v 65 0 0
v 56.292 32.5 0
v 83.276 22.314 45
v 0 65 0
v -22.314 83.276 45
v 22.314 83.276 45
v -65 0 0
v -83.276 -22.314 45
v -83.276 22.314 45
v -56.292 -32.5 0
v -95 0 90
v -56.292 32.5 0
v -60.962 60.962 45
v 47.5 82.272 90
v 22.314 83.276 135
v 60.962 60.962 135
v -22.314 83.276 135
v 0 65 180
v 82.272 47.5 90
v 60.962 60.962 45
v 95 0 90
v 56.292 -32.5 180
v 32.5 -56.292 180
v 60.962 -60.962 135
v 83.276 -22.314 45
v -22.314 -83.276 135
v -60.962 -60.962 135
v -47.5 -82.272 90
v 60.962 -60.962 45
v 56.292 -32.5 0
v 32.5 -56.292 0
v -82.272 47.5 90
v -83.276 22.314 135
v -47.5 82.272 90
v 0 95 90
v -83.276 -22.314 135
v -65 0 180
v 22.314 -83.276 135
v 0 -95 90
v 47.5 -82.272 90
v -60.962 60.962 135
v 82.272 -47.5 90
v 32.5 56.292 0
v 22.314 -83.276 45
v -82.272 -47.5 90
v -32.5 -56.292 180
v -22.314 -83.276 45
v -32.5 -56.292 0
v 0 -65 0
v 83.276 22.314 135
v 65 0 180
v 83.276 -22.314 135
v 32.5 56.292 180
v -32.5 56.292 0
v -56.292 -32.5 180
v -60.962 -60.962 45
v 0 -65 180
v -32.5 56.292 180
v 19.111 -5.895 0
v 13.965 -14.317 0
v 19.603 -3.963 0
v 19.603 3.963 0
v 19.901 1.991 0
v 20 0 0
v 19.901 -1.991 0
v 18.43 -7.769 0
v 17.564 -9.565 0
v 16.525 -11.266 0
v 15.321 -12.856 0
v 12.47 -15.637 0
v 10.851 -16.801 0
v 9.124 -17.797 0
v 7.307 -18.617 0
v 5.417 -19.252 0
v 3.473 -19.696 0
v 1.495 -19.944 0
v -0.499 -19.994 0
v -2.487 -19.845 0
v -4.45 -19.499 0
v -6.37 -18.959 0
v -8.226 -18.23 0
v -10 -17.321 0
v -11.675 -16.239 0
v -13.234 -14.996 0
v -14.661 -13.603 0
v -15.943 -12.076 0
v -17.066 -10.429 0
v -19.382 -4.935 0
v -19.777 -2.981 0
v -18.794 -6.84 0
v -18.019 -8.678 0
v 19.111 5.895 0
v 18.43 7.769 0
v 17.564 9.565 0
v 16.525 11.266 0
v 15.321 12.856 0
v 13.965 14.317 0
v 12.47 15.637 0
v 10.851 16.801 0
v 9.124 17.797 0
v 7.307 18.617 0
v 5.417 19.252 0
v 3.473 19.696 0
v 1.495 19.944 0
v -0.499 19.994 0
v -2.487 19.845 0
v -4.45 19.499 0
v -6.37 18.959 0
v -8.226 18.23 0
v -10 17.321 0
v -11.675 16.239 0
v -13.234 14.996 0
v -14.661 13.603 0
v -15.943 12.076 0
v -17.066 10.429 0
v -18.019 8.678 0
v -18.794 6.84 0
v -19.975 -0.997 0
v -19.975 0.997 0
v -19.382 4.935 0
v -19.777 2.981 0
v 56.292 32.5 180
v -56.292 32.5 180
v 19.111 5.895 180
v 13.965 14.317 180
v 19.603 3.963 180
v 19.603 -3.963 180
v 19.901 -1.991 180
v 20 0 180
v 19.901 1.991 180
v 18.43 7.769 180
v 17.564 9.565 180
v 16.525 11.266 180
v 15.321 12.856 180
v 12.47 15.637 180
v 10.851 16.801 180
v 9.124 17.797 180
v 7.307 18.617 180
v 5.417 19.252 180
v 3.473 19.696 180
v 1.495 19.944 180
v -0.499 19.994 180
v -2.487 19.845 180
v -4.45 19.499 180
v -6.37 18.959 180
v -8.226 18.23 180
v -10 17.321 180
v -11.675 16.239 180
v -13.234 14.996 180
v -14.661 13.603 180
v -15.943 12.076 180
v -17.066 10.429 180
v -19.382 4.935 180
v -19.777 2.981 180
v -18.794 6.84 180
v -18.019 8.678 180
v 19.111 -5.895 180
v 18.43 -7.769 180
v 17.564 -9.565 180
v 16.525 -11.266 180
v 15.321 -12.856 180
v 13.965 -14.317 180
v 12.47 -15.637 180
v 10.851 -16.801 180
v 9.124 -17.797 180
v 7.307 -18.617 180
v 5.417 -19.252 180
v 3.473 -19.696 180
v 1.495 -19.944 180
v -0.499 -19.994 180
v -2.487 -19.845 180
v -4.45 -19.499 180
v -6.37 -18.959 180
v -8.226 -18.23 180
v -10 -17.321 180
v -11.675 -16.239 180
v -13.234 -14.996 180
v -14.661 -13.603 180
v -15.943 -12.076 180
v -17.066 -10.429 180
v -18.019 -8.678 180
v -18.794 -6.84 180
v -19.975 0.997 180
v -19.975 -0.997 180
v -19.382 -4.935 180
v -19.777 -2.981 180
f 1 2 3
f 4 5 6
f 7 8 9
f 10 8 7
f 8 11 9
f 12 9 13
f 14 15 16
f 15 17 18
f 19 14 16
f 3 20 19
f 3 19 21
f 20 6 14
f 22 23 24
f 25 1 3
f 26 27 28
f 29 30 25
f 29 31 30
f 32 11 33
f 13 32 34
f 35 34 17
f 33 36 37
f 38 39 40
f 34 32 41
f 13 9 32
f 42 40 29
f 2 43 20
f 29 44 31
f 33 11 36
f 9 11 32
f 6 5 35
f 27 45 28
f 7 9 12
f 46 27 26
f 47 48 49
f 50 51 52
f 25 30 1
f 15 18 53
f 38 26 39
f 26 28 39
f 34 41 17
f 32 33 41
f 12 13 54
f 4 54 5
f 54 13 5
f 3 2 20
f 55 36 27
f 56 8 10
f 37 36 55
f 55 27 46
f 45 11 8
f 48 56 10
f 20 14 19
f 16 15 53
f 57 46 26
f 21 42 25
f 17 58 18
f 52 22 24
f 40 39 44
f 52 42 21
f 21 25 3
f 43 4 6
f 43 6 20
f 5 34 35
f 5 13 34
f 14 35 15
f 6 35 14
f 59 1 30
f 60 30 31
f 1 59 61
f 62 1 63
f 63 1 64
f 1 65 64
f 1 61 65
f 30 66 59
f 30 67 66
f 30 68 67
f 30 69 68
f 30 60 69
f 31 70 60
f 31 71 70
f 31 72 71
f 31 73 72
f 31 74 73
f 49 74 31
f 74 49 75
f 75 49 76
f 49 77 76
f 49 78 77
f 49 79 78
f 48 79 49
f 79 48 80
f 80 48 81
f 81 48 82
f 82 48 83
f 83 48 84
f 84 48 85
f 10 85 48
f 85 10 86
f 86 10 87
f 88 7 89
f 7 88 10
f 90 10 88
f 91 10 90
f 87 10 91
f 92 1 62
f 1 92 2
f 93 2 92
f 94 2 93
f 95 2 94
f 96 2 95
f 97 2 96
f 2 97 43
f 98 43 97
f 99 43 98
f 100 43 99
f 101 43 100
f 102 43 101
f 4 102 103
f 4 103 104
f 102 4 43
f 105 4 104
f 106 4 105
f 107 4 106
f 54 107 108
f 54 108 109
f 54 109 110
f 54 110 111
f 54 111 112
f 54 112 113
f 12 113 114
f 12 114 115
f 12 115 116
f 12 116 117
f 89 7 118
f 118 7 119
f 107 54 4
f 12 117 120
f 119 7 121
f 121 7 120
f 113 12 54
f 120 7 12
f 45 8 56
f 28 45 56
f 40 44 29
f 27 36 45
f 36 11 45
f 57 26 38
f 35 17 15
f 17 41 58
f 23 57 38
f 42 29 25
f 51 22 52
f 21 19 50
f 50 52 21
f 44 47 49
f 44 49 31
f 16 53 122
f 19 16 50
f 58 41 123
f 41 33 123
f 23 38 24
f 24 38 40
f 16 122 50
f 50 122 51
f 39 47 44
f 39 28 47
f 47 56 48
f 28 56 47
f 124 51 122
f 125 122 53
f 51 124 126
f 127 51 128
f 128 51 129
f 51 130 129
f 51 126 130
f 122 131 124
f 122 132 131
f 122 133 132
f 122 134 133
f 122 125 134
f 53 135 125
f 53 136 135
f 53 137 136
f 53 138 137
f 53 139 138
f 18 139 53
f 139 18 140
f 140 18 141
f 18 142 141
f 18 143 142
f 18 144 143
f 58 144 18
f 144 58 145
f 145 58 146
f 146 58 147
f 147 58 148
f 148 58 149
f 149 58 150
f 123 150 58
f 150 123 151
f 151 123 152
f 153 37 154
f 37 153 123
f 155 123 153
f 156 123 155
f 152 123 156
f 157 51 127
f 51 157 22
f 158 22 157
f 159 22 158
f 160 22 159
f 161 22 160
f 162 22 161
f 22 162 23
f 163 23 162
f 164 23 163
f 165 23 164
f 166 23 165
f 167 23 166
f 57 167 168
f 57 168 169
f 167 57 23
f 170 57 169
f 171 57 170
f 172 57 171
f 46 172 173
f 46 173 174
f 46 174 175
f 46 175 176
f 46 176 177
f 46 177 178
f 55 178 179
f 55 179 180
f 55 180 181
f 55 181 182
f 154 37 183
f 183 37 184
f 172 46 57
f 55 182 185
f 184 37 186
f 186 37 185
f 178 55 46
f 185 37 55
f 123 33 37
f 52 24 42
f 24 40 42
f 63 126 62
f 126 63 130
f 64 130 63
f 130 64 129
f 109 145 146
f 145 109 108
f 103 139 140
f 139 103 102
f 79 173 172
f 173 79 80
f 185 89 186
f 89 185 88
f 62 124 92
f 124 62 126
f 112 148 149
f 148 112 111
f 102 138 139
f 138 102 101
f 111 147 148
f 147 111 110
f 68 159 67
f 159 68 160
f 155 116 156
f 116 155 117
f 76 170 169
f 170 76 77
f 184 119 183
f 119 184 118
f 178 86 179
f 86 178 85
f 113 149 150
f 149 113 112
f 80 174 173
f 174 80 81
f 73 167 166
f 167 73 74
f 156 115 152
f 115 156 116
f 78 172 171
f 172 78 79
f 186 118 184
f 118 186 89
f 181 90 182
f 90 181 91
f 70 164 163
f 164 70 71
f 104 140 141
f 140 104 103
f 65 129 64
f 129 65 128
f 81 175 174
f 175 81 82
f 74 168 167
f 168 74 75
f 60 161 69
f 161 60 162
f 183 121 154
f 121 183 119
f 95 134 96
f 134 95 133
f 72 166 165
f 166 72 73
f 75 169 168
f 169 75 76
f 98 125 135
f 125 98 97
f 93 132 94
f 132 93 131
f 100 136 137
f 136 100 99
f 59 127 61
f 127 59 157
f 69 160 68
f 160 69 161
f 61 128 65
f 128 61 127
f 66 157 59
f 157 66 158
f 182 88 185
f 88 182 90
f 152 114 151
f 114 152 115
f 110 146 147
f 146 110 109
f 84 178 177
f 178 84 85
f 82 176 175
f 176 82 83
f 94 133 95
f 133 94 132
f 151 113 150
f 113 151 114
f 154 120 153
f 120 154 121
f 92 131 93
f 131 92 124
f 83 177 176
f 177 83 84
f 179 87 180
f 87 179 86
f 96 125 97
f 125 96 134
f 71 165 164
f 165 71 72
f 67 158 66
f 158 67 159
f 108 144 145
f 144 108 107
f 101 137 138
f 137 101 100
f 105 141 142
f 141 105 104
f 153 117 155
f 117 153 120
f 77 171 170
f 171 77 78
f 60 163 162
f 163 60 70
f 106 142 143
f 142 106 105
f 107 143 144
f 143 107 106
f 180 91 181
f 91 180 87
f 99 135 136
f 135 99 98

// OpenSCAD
// file: ../../noise/noisey.scad
CylinderPoints = [[65.0, 0.0, 0.0], [56.2917, 32.5, 0.0], [32.5, 56.2917, 0.0], [0.0, 65.0, 0.0], [-32.5, 56.2917, 0.0], [-56.2917, 32.5, 0.0], [-65.0, 0.0, 0.0], [-56.2917, -32.5, 0.0], [-32.5, -56.2917, 0.0], [-0.0, -65.0, 0.0], [32.5, -56.2917, 0.0], [56.2917, -32.5, 0.0], [83.2756, 22.3136, 45.0], [60.9619, 60.9619, 45.0], [22.3136, 83.2756, 45.0], [-22.3136, 83.2756, 45.0], [-60.9619, 60.9619, 45.0], [-83.2756, 22.3136, 45.0], [-83.2756, -22.3136, 45.0], [-60.9619, -60.9619, 45.0], [-22.3136, -83.2756, 45.0], [22.3136, -83.2756, 45.0], [60.9619, -60.9619, 45.0], [83.2756, -22.3136, 45.0], [95.0, 0.0, 90.0], [82.2724, 47.5, 90.0], [47.5, 82.2724, 90.0], [0.0, 95.0, 90.0], [-47.5, 82.2724, 90.0], [-82.2724, 47.5, 90.0], [-95.0, 0.0, 90.0], [-82.2724, -47.5, 90.0], [-47.5, -82.2724, 90.0], [-0.0, -95.0, 90.0], [47.5, -82.2724, 90.0], [82.2724, -47.5, 90.0], [83.2756, 22.3136, 135.0], [60.9619, 60.9619, 135.0], [22.3136, 83.2756, 135.0], [-22.3136, 83.2756, 135.0], [-60.9619, 60.9619, 135.0], [-83.2756, 22.3136, 135.0], [-83.2756, -22.3136, 135.0], [-60.9619, -60.9619, 135.0], [-22.3136, -83.2756, 135.0], [22.3136, -83.2756, 135.0], [60.9619, -60.9619, 135.0], [83.2756, -22.3136, 135.0], [65.0, 0.0, 180.0], [56.2917, 32.5, 180.0], [32.5, 56.2917, 180.0], [0.0, 65.0, 180.0], [-32.5, 56.2917, 180.0], [-56.2917, 32.5, 180.0], [-65.0, 0.0, 180.0], [-56.2917, -32.5, 180.0], [-32.5, -56.2917, 180.0], [-0.0, -65.0, 180.0], [32.5, -56.2917, 180.0], [56.2917, -32.5, 180.0], [0, 0, 0], [0, 0, 180]] ;
CylinderFaces = [[0, 12, 1], [1, 12, 13], [1, 13, 2], [2, 13, 14], [2, 14, 3], [3, 14, 15], [3, 15, 4], [4, 15, 16], [4, 16, 5], [5, 16, 17], [5, 17, 6], [6, 17, 18], [6, 18, 7], [7, 18, 19], [7, 19, 8], [8, 19, 20], [8, 20, 9], [9, 20, 21], [9, 21, 10], [10, 21, 22], [10, 22, 11], [11, 22, 23], [11, 23, 0], [12, 0, 23], [23, 24, 12], [12, 24, 25], [12, 25, 13], [13, 25, 26], [13, 26, 14], [14, 26, 27], [14, 27, 15], [15, 27, 28], [15, 28, 16], [16, 28, 29], [16, 29, 17], [17, 29, 30], [17, 30, 18], [18, 30, 31], [18, 31, 19], [19, 31, 32], [19, 32, 20], [20, 32, 33], [20, 33, 21], [21, 33, 34], [21, 34, 22], [22, 34, 35], [22, 35, 23], [23, 35, 24], [24, 36, 25], [25, 36, 37], [25, 37, 26], [26, 37, 38], [26, 38, 27], [27, 38, 39], [27, 39, 28], [28, 39, 40], [28, 40, 29], [29, 40, 41], [29, 41, 30], [30, 41, 42], [30, 42, 31], [31, 42, 43], [31, 43, 32], [32, 43, 44], [32, 44, 33], [33, 44, 45], [33, 45, 34], [34, 45, 46], [34, 46, 35], [35, 46, 47], [35, 47, 24], [36, 24, 47], [47, 48, 36], [36, 48, 49], [36, 49, 37], [37, 49, 50], [37, 50, 38], [38, 50, 51], [38, 51, 39], [39, 51, 52], [39, 52, 40], [40, 52, 53], [40, 53, 41], [41, 53, 54], [41, 54, 42], [42, 54, 55], [42, 55, 43], [43, 55, 56], [43, 56, 44], [44, 56, 57], [44, 57, 45], [45, 57, 58], [45, 58, 46], [46, 58, 59], [46, 59, 47], [47, 59, 48], [0, 1, 60], [49.0, 48.0, 61], [1, 2, 60], [50.0, 49.0, 61], [2, 3, 60], [51.0, 50.0, 61], [3, 4, 60], [52.0, 51.0, 61], [4, 5, 60], [53.0, 52.0, 61], [5, 6, 60], [54.0, 53.0, 61], [6, 7, 60], [55.0, 54.0, 61], [7, 8, 60], [56.0, 55.0, 61], [8, 9, 60], [57.0, 56.0, 61], [9, 10, 60], [58.0, 57.0, 61], [10, 11, 60], [59.0, 58.0, 61], [11, 0, 60], [48.0, 59.0, 61]] ;
difference() {
    polyhedron( CylinderPoints, CylinderFaces, convexity = 10);
    translate([0,0,-10]) linear_extrude(200) circle(d=40, $fa=1);
}
// main file
// Noise
// A low-poly body generated by noise/noisey_generator.py, which writes noise/noisey.scad.
include <../../noise/noisey.scad>
